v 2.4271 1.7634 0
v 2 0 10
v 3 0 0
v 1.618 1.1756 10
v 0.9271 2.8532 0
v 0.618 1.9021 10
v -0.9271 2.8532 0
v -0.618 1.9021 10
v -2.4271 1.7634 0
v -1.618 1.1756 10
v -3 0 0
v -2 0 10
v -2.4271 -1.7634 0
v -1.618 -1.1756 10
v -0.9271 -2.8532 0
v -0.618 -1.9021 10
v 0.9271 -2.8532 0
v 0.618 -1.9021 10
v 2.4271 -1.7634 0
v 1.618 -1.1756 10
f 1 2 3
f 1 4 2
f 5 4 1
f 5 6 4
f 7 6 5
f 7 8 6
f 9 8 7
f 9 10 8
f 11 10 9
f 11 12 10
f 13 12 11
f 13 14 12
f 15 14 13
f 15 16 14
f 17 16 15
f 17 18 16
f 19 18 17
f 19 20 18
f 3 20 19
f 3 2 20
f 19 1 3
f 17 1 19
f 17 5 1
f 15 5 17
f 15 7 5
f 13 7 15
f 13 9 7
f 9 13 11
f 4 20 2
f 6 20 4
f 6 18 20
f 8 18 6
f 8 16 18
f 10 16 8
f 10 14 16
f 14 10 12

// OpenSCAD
// Unit of length: Unit.MM
cylinder(h = 10.0, d1 = 6.0, d2 = 4.0, center = false);
